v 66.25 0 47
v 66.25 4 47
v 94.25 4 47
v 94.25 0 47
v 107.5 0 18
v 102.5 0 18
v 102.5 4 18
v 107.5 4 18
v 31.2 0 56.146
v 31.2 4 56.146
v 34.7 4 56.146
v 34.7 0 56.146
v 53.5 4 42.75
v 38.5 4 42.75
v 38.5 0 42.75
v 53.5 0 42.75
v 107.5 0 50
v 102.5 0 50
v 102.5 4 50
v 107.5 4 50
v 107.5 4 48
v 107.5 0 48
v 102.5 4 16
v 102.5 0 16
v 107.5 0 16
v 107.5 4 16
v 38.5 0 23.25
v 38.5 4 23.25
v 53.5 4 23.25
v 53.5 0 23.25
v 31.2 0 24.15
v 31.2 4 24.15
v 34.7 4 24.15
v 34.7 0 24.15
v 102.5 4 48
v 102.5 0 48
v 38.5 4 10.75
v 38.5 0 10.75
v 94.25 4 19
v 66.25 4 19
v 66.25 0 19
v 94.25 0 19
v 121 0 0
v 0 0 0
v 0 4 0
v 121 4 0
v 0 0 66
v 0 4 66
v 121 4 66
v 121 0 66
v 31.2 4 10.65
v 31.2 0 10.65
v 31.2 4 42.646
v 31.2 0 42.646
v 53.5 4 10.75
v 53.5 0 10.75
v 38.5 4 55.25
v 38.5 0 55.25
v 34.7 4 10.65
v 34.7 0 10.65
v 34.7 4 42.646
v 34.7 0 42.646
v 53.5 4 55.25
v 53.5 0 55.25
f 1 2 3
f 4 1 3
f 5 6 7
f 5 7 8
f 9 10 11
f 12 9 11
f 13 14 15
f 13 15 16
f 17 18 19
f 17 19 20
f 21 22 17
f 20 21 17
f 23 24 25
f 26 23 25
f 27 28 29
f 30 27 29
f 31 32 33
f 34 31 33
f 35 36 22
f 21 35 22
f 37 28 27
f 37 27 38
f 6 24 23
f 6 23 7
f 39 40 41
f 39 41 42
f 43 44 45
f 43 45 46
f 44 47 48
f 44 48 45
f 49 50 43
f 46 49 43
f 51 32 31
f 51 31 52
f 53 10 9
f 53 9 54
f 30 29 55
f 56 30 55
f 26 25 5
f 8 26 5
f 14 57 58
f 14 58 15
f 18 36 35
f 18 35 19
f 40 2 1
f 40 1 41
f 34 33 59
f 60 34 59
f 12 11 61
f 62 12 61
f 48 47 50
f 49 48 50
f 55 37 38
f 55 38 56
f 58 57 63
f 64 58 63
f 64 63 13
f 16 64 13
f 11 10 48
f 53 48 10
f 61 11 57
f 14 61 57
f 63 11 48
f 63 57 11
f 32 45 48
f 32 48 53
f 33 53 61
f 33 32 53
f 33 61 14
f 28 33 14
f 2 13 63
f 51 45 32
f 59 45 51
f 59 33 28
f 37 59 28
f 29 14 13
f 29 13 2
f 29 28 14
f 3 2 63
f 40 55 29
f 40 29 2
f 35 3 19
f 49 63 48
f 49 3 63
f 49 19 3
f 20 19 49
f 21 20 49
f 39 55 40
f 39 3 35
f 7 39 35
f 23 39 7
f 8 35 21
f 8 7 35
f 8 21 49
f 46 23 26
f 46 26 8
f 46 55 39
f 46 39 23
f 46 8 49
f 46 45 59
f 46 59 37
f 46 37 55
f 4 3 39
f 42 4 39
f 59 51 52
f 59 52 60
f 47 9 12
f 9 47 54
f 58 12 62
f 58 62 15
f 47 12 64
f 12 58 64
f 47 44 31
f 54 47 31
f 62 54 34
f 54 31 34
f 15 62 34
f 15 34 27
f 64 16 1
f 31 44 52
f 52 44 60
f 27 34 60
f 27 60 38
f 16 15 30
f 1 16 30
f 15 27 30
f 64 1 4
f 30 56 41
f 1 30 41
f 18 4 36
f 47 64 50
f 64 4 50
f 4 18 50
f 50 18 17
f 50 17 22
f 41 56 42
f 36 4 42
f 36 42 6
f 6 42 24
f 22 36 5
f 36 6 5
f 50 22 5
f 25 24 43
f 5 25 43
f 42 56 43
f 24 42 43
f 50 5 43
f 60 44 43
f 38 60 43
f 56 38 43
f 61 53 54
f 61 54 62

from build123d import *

# Parameters (mm, degrees)
SKETCH1_W           = 121
SKETCH1_H           = 66
BOSS_EXTRUDE1_DEPTH = 4
SKETCH2_W           = 28
SKETCH2_H           = 28
SKETCH2_W_2         = 15
SKETCH2_H_2         = 12.5
CUT_EXTRUDE1_DEPTH  = 5
SKETCH3_W           = 5
SKETCH3_H           = 2
CUT_EXTRUDE2_DEPTH  = 5
SKETCH4_W           = 3.5
SKETCH4_H           = 13.5
CUT_EXTRUDE3_DEPTH  = 5


with BuildPart() as part:
    # Sketch1 → Boss-Extrude1 (new body)
    with BuildSketch(Plane(origin=(0, 0, 0), x_dir=(1, 0, 0), z_dir=(0, 1, 0))):
        with Locations((60.5, -33)):
            Rectangle(SKETCH1_W, SKETCH1_H)
    extrude(amount=BOSS_EXTRUDE1_DEPTH)

    # Sketch2 → Cut-Extrude1 (cut, through all)
    with BuildSketch(Plane(origin=(0, 4, 0), x_dir=(1, 0, 0), z_dir=(0, 1, 0))):
        with Locations((80.25, -33)):
            Rectangle(SKETCH2_W, SKETCH2_H)
        with Locations((46, -17)):
            Rectangle(SKETCH2_W_2, SKETCH2_H_2)
        with Locations((46, -49)):
            Rectangle(SKETCH2_W_2, SKETCH2_H_2)
    extrude(amount=-CUT_EXTRUDE1_DEPTH, mode=Mode.SUBTRACT)

    # Sketch3 → Cut-Extrude2 (cut, through all)
    with BuildSketch(Plane.XZ):
        with Locations((105, 49)):
            Rectangle(SKETCH3_W, SKETCH3_H)
        with Locations((105, 17)):
            Rectangle(SKETCH3_W, SKETCH3_H)
    extrude(amount=-CUT_EXTRUDE2_DEPTH, mode=Mode.SUBTRACT)

    # Sketch4 → Cut-Extrude3 (cut, through all)
    with BuildSketch(Plane(origin=(0, 4, 0), x_dir=(1, 0, 0), z_dir=(0, 1, 0))):
        with Locations((32.95, -49.395895757)):
            Rectangle(SKETCH4_W, SKETCH4_H)
        with Locations((32.95, -17.399625311)):
            Rectangle(SKETCH4_W, SKETCH4_H)
    extrude(amount=-CUT_EXTRUDE3_DEPTH, mode=Mode.SUBTRACT)


solid = part.part
